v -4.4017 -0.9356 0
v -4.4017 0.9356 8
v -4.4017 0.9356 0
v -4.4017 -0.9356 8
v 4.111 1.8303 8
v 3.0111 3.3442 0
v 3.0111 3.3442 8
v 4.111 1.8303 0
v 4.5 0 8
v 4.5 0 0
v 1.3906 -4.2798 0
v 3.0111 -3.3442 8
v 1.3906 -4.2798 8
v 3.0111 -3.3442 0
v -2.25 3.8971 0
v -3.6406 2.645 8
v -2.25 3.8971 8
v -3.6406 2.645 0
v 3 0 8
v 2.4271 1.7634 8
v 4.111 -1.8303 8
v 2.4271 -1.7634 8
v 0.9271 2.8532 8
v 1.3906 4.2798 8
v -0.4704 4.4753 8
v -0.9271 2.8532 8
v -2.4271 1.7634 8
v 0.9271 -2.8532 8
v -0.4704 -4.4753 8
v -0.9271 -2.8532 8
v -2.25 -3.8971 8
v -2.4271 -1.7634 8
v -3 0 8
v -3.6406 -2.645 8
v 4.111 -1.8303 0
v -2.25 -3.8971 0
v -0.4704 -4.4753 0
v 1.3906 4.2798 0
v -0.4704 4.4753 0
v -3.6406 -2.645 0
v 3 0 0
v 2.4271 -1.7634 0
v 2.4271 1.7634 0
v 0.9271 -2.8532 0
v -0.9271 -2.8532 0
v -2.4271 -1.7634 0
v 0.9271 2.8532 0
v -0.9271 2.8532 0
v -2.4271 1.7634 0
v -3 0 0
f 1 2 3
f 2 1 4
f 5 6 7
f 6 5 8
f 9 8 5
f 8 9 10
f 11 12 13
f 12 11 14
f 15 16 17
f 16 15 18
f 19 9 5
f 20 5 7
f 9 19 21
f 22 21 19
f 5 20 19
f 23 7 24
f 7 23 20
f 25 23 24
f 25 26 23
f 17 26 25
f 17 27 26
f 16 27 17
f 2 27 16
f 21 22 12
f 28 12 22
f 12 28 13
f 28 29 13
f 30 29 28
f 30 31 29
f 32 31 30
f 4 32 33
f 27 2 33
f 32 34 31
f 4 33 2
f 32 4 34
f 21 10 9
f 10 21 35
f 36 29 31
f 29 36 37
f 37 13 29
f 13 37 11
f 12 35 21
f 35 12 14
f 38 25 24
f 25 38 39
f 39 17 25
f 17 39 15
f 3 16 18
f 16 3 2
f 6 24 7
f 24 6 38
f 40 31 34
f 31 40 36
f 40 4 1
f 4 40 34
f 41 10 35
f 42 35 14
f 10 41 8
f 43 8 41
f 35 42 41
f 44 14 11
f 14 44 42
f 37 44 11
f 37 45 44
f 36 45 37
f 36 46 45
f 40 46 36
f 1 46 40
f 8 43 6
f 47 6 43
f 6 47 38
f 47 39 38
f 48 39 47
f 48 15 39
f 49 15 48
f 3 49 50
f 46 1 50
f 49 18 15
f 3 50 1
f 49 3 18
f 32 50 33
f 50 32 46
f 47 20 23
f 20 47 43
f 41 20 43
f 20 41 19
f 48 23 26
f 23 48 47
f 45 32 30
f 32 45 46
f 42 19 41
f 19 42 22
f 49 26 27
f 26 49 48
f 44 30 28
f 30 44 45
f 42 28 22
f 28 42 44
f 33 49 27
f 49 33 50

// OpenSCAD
// Threaded Insert 
difference() {
    cylinder(h=8, r=4.5);
    cylinder(h=9, r=3);
}
